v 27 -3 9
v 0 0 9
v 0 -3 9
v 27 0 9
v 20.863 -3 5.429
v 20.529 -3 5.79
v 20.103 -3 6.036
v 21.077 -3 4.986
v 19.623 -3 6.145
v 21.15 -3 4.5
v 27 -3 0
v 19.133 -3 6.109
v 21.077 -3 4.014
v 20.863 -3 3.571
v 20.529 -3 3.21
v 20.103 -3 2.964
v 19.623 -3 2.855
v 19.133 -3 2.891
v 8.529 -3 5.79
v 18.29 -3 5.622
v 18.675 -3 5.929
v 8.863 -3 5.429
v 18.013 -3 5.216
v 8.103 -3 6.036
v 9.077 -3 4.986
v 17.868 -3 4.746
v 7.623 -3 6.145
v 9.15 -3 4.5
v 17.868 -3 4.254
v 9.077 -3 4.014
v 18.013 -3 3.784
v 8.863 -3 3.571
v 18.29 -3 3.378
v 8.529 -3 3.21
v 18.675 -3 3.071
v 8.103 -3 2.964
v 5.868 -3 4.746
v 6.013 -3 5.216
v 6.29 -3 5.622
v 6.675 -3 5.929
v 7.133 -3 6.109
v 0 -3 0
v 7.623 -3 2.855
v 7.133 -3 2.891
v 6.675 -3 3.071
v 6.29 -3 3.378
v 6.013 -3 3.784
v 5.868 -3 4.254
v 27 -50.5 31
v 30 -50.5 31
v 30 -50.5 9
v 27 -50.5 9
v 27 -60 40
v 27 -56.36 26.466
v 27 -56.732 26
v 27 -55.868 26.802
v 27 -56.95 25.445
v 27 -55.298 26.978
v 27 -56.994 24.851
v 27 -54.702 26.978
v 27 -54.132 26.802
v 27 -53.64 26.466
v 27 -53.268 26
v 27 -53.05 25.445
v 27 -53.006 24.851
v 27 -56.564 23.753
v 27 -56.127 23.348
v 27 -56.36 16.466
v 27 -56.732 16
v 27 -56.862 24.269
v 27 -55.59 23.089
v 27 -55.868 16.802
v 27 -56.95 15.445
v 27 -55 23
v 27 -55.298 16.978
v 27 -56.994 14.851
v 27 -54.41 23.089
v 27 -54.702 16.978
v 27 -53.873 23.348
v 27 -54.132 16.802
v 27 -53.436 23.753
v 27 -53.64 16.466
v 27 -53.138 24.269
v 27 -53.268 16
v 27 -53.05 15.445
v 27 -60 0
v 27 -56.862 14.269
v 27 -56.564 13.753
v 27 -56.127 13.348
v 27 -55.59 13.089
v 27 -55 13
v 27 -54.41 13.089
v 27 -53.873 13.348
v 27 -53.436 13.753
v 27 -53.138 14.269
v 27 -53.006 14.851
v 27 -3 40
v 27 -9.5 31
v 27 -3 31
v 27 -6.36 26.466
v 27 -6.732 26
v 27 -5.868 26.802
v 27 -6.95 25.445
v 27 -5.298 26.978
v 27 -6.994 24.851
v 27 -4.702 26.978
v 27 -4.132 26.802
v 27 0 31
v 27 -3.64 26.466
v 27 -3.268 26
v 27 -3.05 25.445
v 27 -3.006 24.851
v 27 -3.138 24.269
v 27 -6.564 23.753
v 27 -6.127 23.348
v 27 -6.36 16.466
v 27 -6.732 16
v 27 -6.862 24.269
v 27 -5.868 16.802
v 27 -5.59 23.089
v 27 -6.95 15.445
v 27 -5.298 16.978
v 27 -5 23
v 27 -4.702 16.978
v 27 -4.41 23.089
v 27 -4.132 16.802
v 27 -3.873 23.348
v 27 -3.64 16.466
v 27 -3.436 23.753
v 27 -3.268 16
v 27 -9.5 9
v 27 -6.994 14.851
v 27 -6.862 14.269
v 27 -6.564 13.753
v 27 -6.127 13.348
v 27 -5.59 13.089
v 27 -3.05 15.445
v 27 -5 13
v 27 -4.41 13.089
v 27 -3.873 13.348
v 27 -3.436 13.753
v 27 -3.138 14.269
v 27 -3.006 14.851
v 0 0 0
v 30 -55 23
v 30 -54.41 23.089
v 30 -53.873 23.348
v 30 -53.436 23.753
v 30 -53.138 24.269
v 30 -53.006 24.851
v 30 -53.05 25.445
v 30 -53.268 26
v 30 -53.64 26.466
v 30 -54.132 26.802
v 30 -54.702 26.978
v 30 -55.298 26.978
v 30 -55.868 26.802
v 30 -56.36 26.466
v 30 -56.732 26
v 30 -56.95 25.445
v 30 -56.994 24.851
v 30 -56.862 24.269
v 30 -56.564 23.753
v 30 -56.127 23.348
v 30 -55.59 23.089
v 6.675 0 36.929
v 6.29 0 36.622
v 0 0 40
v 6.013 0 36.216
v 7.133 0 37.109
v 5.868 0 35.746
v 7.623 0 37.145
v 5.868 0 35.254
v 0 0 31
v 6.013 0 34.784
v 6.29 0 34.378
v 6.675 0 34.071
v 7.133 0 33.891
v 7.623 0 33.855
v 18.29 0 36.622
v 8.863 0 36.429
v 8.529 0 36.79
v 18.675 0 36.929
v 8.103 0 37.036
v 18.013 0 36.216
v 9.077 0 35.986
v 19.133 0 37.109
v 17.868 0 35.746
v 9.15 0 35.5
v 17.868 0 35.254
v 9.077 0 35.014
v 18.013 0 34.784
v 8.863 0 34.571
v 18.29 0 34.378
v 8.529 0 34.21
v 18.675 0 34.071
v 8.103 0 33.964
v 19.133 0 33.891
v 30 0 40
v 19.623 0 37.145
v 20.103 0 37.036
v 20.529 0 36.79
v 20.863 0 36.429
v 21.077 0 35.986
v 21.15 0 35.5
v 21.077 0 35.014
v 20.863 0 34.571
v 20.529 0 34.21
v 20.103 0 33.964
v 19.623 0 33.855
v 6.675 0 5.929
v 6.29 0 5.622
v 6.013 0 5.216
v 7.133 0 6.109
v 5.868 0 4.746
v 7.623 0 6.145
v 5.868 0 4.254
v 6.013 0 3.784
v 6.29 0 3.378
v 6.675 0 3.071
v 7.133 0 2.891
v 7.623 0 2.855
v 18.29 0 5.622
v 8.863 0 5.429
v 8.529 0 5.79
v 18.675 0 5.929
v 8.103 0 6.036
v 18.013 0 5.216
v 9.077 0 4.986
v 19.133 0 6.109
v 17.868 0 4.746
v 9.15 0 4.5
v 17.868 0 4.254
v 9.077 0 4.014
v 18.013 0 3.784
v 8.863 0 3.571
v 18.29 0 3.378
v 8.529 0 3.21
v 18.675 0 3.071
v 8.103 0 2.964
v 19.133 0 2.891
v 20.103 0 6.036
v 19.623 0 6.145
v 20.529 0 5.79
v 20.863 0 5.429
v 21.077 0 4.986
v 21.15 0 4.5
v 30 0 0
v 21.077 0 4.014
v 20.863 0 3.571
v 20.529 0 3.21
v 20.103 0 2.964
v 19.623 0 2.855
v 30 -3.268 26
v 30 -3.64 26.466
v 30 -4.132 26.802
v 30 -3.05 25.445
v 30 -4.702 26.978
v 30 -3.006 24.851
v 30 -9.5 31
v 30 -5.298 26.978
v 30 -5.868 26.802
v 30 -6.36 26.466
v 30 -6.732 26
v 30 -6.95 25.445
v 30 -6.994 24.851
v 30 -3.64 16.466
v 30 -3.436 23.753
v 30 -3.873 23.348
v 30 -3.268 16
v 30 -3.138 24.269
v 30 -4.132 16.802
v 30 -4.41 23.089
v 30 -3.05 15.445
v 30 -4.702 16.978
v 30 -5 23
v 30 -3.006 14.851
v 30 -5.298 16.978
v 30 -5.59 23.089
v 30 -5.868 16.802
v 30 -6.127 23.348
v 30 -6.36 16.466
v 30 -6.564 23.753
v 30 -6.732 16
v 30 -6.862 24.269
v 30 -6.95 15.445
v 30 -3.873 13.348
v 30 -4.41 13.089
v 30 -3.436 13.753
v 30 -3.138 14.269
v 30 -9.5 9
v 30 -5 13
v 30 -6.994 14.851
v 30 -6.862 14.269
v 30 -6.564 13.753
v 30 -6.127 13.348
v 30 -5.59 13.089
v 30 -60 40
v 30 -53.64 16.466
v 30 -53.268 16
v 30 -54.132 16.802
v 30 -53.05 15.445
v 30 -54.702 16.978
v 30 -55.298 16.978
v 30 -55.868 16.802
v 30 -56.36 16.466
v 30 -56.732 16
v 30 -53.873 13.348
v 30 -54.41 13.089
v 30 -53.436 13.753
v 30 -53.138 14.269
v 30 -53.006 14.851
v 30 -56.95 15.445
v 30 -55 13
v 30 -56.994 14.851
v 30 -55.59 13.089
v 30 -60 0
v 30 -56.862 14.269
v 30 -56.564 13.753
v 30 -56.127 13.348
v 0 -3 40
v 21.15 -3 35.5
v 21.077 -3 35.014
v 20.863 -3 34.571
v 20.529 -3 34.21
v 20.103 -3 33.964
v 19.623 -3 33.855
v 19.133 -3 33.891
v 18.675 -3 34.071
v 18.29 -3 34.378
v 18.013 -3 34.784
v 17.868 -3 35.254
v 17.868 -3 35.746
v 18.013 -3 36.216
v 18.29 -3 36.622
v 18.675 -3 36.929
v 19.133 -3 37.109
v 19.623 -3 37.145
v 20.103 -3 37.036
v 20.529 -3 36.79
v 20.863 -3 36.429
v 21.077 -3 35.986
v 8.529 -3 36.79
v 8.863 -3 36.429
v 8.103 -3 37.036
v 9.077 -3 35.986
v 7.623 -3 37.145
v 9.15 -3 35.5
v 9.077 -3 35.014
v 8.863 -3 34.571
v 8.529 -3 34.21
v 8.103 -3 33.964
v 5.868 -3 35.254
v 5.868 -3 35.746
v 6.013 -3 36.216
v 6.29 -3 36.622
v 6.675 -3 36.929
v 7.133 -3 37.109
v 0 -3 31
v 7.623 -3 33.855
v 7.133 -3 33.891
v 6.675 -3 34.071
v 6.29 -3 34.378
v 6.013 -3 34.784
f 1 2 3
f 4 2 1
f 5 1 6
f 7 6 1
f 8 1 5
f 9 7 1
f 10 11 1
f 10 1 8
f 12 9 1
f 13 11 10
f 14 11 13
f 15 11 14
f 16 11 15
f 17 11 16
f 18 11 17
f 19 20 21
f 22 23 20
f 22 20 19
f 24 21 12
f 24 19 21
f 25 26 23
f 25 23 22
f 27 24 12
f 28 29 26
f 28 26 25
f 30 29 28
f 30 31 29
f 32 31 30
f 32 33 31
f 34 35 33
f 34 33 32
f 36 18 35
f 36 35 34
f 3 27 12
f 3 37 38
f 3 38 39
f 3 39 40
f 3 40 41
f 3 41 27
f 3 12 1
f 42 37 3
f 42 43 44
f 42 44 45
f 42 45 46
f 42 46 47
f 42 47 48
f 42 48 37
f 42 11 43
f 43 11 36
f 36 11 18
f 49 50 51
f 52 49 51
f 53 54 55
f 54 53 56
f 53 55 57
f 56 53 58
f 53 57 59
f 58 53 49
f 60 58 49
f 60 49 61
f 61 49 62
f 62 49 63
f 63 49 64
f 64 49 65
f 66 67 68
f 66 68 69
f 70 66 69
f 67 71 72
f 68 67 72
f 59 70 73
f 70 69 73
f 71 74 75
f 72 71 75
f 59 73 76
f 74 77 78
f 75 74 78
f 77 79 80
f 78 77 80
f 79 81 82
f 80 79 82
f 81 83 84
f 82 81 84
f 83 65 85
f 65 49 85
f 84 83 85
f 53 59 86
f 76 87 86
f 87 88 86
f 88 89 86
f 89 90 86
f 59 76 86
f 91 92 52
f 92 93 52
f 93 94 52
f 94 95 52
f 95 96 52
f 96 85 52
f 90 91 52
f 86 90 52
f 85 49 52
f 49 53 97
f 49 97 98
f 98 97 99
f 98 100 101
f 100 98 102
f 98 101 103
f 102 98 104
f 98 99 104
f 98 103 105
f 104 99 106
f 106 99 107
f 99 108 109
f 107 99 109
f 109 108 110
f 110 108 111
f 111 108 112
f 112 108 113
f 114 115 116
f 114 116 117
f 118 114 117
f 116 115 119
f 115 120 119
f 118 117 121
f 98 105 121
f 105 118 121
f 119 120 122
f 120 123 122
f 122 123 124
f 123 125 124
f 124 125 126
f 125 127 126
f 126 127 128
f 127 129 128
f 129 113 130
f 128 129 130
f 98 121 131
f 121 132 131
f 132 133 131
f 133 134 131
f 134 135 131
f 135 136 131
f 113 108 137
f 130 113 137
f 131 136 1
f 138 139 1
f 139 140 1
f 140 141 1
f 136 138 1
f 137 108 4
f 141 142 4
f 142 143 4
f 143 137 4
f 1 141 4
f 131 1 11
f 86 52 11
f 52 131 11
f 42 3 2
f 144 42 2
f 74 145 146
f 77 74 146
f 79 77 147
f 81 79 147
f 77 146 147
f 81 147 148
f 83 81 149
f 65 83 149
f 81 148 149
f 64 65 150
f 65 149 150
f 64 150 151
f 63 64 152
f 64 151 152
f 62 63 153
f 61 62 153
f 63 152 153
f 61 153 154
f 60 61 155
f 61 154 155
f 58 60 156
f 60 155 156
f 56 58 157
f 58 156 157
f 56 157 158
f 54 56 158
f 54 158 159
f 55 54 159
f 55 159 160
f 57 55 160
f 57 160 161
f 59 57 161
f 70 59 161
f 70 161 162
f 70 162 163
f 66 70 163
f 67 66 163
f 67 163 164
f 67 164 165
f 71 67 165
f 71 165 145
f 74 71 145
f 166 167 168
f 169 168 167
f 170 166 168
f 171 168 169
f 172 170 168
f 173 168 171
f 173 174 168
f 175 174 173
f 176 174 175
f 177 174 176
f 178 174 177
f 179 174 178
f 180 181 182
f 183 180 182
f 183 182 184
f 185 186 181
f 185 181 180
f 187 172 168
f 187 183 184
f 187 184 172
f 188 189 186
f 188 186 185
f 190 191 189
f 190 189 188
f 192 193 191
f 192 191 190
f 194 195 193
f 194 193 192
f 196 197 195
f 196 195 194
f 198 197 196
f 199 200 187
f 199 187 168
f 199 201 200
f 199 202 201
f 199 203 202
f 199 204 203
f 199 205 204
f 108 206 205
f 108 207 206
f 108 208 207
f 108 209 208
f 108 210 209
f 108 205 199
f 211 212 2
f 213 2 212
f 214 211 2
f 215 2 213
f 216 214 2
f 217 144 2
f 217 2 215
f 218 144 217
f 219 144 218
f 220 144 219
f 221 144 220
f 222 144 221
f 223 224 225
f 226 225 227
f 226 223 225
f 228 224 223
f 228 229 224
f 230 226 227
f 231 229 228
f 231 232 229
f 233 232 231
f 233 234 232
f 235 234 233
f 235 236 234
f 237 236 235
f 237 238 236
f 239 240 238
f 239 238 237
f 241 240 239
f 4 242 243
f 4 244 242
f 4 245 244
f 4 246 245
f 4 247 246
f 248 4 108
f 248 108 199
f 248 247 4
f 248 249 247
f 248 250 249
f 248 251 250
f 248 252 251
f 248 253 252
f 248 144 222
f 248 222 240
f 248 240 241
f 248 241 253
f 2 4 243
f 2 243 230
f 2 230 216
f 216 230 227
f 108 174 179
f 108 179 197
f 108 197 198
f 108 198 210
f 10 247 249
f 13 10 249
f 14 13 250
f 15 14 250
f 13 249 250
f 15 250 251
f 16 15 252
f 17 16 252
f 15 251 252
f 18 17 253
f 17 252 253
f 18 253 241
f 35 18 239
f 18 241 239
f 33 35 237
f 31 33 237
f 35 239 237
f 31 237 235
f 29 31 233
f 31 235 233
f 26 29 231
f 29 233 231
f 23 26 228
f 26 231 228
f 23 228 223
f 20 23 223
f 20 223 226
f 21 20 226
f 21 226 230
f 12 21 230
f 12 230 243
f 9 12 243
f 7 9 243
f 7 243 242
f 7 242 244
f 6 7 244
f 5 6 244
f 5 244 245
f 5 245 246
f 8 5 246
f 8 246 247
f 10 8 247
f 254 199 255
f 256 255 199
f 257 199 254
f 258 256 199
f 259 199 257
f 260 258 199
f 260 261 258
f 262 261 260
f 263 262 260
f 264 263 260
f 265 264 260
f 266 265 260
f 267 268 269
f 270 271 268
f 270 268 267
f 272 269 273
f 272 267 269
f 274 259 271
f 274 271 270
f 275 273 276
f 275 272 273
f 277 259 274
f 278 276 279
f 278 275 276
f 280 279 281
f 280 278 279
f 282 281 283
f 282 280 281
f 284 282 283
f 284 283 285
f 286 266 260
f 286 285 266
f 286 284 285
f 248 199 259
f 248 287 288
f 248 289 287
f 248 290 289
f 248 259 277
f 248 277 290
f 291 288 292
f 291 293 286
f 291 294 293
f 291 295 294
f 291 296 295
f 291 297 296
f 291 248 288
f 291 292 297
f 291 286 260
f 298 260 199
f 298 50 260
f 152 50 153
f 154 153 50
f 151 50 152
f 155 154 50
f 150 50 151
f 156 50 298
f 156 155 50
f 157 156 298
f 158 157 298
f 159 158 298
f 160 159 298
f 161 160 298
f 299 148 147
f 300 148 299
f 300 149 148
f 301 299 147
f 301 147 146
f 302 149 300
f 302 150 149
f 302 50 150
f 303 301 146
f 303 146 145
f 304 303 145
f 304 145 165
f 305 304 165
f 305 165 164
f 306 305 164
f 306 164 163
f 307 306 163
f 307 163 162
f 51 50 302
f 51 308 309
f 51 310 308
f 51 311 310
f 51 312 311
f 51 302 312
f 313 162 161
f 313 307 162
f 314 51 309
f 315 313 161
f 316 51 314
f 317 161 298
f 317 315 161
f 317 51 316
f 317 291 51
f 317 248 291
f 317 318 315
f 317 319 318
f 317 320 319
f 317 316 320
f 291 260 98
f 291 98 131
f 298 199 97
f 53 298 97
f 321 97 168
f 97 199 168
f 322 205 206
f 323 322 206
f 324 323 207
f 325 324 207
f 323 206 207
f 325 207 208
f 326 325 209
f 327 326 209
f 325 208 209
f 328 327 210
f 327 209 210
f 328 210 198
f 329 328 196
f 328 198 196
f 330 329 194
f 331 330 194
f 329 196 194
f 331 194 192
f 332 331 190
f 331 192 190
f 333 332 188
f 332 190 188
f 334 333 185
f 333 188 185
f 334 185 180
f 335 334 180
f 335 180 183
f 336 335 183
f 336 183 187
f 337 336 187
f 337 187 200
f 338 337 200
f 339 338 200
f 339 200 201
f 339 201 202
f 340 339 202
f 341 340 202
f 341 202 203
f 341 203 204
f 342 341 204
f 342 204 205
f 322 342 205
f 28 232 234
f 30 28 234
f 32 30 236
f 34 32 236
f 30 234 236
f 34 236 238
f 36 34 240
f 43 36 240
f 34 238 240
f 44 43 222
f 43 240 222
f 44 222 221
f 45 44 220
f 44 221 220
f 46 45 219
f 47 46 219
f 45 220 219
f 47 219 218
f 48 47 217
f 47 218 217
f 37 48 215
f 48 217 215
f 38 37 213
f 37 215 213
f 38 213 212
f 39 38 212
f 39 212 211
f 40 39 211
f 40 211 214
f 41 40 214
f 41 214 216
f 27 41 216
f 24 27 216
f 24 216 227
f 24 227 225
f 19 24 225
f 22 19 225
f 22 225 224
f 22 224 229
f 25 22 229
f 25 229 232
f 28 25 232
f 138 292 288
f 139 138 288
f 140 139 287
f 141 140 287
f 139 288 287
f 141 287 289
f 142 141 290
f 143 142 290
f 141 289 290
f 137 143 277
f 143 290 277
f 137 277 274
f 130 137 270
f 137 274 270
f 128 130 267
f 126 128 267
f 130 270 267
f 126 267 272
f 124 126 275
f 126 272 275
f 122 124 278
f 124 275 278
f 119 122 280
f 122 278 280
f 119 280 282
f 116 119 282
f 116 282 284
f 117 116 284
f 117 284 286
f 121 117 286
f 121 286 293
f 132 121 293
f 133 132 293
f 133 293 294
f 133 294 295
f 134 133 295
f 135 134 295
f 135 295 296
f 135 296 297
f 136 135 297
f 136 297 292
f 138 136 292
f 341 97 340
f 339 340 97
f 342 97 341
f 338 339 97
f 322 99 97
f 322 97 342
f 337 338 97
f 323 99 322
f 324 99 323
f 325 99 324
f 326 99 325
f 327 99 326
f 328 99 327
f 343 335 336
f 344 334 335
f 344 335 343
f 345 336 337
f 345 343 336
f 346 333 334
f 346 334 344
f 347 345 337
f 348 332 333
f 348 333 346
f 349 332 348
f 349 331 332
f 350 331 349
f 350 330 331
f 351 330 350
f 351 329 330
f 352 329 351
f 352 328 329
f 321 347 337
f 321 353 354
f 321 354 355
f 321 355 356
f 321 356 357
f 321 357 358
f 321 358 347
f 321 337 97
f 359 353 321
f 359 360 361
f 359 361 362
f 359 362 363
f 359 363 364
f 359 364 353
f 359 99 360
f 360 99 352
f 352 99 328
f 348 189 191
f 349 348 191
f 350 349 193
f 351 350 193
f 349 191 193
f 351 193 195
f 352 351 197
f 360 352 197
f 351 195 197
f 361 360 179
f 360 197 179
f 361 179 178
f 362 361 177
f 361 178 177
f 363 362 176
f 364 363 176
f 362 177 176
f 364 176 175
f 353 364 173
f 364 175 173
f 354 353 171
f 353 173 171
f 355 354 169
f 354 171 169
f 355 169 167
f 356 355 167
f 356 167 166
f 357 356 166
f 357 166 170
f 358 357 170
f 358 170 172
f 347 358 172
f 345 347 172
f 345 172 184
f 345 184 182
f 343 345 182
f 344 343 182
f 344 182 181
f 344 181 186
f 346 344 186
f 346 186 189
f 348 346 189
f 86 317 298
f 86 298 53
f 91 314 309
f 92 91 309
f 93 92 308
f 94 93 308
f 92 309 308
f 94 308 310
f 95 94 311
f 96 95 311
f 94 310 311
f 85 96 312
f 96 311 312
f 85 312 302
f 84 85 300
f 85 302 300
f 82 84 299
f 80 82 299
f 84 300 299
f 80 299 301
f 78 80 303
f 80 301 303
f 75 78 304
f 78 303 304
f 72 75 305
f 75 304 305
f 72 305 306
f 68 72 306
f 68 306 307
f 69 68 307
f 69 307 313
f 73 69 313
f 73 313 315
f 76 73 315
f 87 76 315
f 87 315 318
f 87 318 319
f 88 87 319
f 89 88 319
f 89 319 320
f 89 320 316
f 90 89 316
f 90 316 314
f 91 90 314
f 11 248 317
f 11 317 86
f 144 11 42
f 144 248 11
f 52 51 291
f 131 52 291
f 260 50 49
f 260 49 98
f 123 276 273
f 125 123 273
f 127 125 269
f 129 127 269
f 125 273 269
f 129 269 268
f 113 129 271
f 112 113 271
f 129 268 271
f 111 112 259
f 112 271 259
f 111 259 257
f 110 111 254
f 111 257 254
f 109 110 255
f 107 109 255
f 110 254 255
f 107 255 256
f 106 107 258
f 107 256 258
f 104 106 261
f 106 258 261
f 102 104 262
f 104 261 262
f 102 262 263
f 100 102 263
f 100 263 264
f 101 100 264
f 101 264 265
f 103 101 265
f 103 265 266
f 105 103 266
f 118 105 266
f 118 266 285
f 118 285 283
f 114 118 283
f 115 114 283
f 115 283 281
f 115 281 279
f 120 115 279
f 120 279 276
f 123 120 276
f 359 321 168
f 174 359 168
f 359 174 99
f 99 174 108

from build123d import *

# Parameters (mm, degrees)
EXTRUDE_1_DEPTH     = 40
SKETCH_2_R          = 1.65
SKETCH_2_W          = 27
SKETCH_2_H          = 22
CUT_EXTRUDE_2_DEPTH = 10
SKETCH_3_R          = 2
SKETCH_3_W          = 22
SKETCH_3_H          = 41
CUT_EXTRUDE_3_DEPTH = 10


with BuildPart() as part:
    # 草图1 → 凸台-拉伸1 (new body)
    with BuildSketch(Plane.XY):
        Polygon((0, 0), (30, 0), (30, -60), (27, -60), (27, -3), (0, -3), align=None)
    extrude(amount=EXTRUDE_1_DEPTH)

    # 草图2 → 切除-拉伸2 (cut)
    with BuildSketch(Plane(origin=(0, 0, 0), x_dir=(1, 0, 0), z_dir=(0, 1, 0))):
        with Locations((7.5, -4.5)):
            Circle(SKETCH_2_R)
        with Locations((19.5, -4.5)):
            Circle(SKETCH_2_R)
        with Locations((19.5, -35.5)):
            Circle(SKETCH_2_R)
        with Locations((7.5, -35.5)):
            Circle(SKETCH_2_R)
        with Locations((13.5, -20)):
            Rectangle(SKETCH_2_W, SKETCH_2_H)
    extrude(amount=-CUT_EXTRUDE_2_DEPTH, mode=Mode.SUBTRACT)

    # 草图3 → 切除-拉伸3 (cut)
    with BuildSketch(Plane(origin=(30, 0, 0), x_dir=(0, 0, -1), z_dir=(1, 0, 0))):
        with Locations((-25, -5)):
            Circle(SKETCH_3_R)
        with Locations((-15, -5)):
            Circle(SKETCH_3_R)
        with Locations((-15, -55)):
            Circle(SKETCH_3_R)
        with Locations((-25, -55)):
            Circle(SKETCH_3_R)
        with Locations((-20, -30)):
            Rectangle(SKETCH_3_W, SKETCH_3_H)
    extrude(amount=-CUT_EXTRUDE_3_DEPTH, mode=Mode.SUBTRACT)


solid = part.part
